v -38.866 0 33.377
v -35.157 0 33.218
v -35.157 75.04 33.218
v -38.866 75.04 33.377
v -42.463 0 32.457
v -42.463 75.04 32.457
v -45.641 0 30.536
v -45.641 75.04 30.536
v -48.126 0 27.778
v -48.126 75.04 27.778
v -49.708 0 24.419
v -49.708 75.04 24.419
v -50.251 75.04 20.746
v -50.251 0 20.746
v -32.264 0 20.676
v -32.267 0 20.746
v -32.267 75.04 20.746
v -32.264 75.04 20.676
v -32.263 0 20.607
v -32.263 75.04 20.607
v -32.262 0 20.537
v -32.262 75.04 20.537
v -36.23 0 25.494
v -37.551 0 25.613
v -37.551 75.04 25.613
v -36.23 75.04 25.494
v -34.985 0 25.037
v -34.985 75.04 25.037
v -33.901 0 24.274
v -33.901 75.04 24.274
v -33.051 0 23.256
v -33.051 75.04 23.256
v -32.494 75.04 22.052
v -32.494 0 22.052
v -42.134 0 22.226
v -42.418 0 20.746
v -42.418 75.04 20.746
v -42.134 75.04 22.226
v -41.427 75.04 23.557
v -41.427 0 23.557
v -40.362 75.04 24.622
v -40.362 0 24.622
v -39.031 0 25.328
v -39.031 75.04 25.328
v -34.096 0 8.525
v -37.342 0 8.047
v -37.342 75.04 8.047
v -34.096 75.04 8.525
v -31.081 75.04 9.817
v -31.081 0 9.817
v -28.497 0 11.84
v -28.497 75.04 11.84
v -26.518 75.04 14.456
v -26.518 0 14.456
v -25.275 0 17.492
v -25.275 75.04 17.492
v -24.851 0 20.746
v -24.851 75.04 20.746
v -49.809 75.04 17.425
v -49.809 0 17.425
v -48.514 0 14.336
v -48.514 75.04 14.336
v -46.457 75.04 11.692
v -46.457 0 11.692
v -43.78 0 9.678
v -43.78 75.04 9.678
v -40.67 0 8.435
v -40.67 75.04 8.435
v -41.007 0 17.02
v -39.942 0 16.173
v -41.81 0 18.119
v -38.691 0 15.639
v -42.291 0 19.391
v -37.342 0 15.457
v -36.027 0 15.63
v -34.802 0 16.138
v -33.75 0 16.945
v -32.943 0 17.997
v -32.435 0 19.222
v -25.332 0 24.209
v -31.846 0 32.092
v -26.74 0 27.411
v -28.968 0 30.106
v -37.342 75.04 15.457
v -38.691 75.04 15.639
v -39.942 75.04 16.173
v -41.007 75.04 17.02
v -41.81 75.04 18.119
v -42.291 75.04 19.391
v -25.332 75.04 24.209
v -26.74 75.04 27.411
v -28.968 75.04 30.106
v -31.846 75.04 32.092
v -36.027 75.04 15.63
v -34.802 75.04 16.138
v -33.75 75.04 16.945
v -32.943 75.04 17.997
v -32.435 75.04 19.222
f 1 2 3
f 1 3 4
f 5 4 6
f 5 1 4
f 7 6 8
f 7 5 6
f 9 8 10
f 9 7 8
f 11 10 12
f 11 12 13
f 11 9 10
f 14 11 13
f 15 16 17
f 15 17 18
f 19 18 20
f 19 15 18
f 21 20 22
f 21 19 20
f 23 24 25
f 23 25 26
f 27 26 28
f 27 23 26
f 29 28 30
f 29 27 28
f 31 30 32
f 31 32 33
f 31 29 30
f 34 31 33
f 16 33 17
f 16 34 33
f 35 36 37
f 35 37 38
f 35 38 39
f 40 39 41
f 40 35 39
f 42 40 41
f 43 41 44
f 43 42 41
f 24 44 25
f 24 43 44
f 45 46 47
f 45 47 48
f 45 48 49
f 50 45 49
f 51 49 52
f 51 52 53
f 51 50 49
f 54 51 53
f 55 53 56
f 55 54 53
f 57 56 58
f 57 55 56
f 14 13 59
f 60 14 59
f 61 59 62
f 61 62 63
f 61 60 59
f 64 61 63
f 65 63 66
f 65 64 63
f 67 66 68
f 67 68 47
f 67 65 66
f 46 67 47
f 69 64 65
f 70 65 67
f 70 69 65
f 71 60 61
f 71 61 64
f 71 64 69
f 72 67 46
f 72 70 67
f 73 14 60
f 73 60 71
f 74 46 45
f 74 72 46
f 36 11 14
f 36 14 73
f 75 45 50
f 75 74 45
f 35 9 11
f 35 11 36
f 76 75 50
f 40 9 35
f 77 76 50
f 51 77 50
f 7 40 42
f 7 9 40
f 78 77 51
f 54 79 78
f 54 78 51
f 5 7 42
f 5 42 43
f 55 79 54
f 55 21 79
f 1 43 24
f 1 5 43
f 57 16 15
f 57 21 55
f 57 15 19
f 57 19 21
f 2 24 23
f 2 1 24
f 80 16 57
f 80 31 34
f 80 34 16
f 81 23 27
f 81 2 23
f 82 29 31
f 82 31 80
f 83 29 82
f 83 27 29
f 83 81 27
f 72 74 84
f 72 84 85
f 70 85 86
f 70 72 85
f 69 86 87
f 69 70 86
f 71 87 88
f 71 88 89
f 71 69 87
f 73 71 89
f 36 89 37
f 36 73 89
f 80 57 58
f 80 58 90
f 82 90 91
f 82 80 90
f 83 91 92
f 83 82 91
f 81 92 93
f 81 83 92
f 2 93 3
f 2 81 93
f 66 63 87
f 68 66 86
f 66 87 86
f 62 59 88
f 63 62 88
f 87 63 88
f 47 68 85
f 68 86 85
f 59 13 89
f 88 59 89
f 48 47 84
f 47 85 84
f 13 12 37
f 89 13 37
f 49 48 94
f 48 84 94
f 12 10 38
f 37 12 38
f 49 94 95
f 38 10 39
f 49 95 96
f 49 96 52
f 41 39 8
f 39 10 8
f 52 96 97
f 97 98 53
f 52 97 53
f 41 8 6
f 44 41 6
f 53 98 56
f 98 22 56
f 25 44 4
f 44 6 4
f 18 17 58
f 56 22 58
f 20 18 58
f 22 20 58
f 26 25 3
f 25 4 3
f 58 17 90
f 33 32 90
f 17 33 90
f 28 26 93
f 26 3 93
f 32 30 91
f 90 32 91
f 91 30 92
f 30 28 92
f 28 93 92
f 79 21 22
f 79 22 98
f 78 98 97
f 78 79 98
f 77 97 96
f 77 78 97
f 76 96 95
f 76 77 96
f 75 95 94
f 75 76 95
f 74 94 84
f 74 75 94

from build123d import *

# Parameters (mm, degrees)
F1_DEPTH = 75.039662


with BuildPart() as f1:
    # F0 (on Front) → F1 (new body)
    with BuildSketch(Plane.XZ):
        with BuildLine():
            Line((-32.266583, 20.745724), (-24.850886, 20.745724))
            ThreePointArc((-24.850886, 20.745724), (-27.760783, 28.835463), (-35.157008, 33.218068))
            Line((-35.157008, 33.218068), (-37.550886, 25.612847))
            ThreePointArc((-37.550886, 25.612847), (-33.900721, 24.2737), (-32.266583, 20.745724))
        make_face()
        with BuildLine():
            ThreePointArc((-37.342298, 8.047438), (-28.497183, 11.839521), (-24.850886, 20.745724))
            Line((-24.850886, 20.745724), (-32.266583, 20.745724))
            ThreePointArc((-32.266583, 20.745724), (-32.26337, 20.64145), (-32.262298, 20.537131))
            ThreePointArc((-32.262298, 20.537131), (-33.750196, 16.945029), (-37.342298, 15.457131))
            Line((-37.342298, 15.457131), (-37.342298, 8.047438))
        make_face()
        with BuildLine():
            Line((-37.550886, 25.612847), (-35.157008, 33.218068))
            ThreePointArc((-35.157008, 33.218068), (-45.640625, 30.535828), (-50.250886, 20.745724))
            Line((-50.250886, 20.745724), (-42.418014, 20.745724))
            ThreePointArc((-42.418014, 20.745724), (-40.934399, 24.129236), (-37.550886, 25.612847))
        make_face()
        with BuildLine():
            ThreePointArc((-50.250886, 20.745724), (-46.45709, 11.692022), (-37.342298, 8.047438))
            Line((-37.342298, 8.047438), (-37.342298, 15.457131))
            ThreePointArc((-37.342298, 15.457131), (-41.007408, 17.019551), (-42.418014, 20.745724))
            Line((-42.418014, 20.745724), (-50.250886, 20.745724))
        make_face()
    extrude(amount=-F1_DEPTH)


solid = f1.part
